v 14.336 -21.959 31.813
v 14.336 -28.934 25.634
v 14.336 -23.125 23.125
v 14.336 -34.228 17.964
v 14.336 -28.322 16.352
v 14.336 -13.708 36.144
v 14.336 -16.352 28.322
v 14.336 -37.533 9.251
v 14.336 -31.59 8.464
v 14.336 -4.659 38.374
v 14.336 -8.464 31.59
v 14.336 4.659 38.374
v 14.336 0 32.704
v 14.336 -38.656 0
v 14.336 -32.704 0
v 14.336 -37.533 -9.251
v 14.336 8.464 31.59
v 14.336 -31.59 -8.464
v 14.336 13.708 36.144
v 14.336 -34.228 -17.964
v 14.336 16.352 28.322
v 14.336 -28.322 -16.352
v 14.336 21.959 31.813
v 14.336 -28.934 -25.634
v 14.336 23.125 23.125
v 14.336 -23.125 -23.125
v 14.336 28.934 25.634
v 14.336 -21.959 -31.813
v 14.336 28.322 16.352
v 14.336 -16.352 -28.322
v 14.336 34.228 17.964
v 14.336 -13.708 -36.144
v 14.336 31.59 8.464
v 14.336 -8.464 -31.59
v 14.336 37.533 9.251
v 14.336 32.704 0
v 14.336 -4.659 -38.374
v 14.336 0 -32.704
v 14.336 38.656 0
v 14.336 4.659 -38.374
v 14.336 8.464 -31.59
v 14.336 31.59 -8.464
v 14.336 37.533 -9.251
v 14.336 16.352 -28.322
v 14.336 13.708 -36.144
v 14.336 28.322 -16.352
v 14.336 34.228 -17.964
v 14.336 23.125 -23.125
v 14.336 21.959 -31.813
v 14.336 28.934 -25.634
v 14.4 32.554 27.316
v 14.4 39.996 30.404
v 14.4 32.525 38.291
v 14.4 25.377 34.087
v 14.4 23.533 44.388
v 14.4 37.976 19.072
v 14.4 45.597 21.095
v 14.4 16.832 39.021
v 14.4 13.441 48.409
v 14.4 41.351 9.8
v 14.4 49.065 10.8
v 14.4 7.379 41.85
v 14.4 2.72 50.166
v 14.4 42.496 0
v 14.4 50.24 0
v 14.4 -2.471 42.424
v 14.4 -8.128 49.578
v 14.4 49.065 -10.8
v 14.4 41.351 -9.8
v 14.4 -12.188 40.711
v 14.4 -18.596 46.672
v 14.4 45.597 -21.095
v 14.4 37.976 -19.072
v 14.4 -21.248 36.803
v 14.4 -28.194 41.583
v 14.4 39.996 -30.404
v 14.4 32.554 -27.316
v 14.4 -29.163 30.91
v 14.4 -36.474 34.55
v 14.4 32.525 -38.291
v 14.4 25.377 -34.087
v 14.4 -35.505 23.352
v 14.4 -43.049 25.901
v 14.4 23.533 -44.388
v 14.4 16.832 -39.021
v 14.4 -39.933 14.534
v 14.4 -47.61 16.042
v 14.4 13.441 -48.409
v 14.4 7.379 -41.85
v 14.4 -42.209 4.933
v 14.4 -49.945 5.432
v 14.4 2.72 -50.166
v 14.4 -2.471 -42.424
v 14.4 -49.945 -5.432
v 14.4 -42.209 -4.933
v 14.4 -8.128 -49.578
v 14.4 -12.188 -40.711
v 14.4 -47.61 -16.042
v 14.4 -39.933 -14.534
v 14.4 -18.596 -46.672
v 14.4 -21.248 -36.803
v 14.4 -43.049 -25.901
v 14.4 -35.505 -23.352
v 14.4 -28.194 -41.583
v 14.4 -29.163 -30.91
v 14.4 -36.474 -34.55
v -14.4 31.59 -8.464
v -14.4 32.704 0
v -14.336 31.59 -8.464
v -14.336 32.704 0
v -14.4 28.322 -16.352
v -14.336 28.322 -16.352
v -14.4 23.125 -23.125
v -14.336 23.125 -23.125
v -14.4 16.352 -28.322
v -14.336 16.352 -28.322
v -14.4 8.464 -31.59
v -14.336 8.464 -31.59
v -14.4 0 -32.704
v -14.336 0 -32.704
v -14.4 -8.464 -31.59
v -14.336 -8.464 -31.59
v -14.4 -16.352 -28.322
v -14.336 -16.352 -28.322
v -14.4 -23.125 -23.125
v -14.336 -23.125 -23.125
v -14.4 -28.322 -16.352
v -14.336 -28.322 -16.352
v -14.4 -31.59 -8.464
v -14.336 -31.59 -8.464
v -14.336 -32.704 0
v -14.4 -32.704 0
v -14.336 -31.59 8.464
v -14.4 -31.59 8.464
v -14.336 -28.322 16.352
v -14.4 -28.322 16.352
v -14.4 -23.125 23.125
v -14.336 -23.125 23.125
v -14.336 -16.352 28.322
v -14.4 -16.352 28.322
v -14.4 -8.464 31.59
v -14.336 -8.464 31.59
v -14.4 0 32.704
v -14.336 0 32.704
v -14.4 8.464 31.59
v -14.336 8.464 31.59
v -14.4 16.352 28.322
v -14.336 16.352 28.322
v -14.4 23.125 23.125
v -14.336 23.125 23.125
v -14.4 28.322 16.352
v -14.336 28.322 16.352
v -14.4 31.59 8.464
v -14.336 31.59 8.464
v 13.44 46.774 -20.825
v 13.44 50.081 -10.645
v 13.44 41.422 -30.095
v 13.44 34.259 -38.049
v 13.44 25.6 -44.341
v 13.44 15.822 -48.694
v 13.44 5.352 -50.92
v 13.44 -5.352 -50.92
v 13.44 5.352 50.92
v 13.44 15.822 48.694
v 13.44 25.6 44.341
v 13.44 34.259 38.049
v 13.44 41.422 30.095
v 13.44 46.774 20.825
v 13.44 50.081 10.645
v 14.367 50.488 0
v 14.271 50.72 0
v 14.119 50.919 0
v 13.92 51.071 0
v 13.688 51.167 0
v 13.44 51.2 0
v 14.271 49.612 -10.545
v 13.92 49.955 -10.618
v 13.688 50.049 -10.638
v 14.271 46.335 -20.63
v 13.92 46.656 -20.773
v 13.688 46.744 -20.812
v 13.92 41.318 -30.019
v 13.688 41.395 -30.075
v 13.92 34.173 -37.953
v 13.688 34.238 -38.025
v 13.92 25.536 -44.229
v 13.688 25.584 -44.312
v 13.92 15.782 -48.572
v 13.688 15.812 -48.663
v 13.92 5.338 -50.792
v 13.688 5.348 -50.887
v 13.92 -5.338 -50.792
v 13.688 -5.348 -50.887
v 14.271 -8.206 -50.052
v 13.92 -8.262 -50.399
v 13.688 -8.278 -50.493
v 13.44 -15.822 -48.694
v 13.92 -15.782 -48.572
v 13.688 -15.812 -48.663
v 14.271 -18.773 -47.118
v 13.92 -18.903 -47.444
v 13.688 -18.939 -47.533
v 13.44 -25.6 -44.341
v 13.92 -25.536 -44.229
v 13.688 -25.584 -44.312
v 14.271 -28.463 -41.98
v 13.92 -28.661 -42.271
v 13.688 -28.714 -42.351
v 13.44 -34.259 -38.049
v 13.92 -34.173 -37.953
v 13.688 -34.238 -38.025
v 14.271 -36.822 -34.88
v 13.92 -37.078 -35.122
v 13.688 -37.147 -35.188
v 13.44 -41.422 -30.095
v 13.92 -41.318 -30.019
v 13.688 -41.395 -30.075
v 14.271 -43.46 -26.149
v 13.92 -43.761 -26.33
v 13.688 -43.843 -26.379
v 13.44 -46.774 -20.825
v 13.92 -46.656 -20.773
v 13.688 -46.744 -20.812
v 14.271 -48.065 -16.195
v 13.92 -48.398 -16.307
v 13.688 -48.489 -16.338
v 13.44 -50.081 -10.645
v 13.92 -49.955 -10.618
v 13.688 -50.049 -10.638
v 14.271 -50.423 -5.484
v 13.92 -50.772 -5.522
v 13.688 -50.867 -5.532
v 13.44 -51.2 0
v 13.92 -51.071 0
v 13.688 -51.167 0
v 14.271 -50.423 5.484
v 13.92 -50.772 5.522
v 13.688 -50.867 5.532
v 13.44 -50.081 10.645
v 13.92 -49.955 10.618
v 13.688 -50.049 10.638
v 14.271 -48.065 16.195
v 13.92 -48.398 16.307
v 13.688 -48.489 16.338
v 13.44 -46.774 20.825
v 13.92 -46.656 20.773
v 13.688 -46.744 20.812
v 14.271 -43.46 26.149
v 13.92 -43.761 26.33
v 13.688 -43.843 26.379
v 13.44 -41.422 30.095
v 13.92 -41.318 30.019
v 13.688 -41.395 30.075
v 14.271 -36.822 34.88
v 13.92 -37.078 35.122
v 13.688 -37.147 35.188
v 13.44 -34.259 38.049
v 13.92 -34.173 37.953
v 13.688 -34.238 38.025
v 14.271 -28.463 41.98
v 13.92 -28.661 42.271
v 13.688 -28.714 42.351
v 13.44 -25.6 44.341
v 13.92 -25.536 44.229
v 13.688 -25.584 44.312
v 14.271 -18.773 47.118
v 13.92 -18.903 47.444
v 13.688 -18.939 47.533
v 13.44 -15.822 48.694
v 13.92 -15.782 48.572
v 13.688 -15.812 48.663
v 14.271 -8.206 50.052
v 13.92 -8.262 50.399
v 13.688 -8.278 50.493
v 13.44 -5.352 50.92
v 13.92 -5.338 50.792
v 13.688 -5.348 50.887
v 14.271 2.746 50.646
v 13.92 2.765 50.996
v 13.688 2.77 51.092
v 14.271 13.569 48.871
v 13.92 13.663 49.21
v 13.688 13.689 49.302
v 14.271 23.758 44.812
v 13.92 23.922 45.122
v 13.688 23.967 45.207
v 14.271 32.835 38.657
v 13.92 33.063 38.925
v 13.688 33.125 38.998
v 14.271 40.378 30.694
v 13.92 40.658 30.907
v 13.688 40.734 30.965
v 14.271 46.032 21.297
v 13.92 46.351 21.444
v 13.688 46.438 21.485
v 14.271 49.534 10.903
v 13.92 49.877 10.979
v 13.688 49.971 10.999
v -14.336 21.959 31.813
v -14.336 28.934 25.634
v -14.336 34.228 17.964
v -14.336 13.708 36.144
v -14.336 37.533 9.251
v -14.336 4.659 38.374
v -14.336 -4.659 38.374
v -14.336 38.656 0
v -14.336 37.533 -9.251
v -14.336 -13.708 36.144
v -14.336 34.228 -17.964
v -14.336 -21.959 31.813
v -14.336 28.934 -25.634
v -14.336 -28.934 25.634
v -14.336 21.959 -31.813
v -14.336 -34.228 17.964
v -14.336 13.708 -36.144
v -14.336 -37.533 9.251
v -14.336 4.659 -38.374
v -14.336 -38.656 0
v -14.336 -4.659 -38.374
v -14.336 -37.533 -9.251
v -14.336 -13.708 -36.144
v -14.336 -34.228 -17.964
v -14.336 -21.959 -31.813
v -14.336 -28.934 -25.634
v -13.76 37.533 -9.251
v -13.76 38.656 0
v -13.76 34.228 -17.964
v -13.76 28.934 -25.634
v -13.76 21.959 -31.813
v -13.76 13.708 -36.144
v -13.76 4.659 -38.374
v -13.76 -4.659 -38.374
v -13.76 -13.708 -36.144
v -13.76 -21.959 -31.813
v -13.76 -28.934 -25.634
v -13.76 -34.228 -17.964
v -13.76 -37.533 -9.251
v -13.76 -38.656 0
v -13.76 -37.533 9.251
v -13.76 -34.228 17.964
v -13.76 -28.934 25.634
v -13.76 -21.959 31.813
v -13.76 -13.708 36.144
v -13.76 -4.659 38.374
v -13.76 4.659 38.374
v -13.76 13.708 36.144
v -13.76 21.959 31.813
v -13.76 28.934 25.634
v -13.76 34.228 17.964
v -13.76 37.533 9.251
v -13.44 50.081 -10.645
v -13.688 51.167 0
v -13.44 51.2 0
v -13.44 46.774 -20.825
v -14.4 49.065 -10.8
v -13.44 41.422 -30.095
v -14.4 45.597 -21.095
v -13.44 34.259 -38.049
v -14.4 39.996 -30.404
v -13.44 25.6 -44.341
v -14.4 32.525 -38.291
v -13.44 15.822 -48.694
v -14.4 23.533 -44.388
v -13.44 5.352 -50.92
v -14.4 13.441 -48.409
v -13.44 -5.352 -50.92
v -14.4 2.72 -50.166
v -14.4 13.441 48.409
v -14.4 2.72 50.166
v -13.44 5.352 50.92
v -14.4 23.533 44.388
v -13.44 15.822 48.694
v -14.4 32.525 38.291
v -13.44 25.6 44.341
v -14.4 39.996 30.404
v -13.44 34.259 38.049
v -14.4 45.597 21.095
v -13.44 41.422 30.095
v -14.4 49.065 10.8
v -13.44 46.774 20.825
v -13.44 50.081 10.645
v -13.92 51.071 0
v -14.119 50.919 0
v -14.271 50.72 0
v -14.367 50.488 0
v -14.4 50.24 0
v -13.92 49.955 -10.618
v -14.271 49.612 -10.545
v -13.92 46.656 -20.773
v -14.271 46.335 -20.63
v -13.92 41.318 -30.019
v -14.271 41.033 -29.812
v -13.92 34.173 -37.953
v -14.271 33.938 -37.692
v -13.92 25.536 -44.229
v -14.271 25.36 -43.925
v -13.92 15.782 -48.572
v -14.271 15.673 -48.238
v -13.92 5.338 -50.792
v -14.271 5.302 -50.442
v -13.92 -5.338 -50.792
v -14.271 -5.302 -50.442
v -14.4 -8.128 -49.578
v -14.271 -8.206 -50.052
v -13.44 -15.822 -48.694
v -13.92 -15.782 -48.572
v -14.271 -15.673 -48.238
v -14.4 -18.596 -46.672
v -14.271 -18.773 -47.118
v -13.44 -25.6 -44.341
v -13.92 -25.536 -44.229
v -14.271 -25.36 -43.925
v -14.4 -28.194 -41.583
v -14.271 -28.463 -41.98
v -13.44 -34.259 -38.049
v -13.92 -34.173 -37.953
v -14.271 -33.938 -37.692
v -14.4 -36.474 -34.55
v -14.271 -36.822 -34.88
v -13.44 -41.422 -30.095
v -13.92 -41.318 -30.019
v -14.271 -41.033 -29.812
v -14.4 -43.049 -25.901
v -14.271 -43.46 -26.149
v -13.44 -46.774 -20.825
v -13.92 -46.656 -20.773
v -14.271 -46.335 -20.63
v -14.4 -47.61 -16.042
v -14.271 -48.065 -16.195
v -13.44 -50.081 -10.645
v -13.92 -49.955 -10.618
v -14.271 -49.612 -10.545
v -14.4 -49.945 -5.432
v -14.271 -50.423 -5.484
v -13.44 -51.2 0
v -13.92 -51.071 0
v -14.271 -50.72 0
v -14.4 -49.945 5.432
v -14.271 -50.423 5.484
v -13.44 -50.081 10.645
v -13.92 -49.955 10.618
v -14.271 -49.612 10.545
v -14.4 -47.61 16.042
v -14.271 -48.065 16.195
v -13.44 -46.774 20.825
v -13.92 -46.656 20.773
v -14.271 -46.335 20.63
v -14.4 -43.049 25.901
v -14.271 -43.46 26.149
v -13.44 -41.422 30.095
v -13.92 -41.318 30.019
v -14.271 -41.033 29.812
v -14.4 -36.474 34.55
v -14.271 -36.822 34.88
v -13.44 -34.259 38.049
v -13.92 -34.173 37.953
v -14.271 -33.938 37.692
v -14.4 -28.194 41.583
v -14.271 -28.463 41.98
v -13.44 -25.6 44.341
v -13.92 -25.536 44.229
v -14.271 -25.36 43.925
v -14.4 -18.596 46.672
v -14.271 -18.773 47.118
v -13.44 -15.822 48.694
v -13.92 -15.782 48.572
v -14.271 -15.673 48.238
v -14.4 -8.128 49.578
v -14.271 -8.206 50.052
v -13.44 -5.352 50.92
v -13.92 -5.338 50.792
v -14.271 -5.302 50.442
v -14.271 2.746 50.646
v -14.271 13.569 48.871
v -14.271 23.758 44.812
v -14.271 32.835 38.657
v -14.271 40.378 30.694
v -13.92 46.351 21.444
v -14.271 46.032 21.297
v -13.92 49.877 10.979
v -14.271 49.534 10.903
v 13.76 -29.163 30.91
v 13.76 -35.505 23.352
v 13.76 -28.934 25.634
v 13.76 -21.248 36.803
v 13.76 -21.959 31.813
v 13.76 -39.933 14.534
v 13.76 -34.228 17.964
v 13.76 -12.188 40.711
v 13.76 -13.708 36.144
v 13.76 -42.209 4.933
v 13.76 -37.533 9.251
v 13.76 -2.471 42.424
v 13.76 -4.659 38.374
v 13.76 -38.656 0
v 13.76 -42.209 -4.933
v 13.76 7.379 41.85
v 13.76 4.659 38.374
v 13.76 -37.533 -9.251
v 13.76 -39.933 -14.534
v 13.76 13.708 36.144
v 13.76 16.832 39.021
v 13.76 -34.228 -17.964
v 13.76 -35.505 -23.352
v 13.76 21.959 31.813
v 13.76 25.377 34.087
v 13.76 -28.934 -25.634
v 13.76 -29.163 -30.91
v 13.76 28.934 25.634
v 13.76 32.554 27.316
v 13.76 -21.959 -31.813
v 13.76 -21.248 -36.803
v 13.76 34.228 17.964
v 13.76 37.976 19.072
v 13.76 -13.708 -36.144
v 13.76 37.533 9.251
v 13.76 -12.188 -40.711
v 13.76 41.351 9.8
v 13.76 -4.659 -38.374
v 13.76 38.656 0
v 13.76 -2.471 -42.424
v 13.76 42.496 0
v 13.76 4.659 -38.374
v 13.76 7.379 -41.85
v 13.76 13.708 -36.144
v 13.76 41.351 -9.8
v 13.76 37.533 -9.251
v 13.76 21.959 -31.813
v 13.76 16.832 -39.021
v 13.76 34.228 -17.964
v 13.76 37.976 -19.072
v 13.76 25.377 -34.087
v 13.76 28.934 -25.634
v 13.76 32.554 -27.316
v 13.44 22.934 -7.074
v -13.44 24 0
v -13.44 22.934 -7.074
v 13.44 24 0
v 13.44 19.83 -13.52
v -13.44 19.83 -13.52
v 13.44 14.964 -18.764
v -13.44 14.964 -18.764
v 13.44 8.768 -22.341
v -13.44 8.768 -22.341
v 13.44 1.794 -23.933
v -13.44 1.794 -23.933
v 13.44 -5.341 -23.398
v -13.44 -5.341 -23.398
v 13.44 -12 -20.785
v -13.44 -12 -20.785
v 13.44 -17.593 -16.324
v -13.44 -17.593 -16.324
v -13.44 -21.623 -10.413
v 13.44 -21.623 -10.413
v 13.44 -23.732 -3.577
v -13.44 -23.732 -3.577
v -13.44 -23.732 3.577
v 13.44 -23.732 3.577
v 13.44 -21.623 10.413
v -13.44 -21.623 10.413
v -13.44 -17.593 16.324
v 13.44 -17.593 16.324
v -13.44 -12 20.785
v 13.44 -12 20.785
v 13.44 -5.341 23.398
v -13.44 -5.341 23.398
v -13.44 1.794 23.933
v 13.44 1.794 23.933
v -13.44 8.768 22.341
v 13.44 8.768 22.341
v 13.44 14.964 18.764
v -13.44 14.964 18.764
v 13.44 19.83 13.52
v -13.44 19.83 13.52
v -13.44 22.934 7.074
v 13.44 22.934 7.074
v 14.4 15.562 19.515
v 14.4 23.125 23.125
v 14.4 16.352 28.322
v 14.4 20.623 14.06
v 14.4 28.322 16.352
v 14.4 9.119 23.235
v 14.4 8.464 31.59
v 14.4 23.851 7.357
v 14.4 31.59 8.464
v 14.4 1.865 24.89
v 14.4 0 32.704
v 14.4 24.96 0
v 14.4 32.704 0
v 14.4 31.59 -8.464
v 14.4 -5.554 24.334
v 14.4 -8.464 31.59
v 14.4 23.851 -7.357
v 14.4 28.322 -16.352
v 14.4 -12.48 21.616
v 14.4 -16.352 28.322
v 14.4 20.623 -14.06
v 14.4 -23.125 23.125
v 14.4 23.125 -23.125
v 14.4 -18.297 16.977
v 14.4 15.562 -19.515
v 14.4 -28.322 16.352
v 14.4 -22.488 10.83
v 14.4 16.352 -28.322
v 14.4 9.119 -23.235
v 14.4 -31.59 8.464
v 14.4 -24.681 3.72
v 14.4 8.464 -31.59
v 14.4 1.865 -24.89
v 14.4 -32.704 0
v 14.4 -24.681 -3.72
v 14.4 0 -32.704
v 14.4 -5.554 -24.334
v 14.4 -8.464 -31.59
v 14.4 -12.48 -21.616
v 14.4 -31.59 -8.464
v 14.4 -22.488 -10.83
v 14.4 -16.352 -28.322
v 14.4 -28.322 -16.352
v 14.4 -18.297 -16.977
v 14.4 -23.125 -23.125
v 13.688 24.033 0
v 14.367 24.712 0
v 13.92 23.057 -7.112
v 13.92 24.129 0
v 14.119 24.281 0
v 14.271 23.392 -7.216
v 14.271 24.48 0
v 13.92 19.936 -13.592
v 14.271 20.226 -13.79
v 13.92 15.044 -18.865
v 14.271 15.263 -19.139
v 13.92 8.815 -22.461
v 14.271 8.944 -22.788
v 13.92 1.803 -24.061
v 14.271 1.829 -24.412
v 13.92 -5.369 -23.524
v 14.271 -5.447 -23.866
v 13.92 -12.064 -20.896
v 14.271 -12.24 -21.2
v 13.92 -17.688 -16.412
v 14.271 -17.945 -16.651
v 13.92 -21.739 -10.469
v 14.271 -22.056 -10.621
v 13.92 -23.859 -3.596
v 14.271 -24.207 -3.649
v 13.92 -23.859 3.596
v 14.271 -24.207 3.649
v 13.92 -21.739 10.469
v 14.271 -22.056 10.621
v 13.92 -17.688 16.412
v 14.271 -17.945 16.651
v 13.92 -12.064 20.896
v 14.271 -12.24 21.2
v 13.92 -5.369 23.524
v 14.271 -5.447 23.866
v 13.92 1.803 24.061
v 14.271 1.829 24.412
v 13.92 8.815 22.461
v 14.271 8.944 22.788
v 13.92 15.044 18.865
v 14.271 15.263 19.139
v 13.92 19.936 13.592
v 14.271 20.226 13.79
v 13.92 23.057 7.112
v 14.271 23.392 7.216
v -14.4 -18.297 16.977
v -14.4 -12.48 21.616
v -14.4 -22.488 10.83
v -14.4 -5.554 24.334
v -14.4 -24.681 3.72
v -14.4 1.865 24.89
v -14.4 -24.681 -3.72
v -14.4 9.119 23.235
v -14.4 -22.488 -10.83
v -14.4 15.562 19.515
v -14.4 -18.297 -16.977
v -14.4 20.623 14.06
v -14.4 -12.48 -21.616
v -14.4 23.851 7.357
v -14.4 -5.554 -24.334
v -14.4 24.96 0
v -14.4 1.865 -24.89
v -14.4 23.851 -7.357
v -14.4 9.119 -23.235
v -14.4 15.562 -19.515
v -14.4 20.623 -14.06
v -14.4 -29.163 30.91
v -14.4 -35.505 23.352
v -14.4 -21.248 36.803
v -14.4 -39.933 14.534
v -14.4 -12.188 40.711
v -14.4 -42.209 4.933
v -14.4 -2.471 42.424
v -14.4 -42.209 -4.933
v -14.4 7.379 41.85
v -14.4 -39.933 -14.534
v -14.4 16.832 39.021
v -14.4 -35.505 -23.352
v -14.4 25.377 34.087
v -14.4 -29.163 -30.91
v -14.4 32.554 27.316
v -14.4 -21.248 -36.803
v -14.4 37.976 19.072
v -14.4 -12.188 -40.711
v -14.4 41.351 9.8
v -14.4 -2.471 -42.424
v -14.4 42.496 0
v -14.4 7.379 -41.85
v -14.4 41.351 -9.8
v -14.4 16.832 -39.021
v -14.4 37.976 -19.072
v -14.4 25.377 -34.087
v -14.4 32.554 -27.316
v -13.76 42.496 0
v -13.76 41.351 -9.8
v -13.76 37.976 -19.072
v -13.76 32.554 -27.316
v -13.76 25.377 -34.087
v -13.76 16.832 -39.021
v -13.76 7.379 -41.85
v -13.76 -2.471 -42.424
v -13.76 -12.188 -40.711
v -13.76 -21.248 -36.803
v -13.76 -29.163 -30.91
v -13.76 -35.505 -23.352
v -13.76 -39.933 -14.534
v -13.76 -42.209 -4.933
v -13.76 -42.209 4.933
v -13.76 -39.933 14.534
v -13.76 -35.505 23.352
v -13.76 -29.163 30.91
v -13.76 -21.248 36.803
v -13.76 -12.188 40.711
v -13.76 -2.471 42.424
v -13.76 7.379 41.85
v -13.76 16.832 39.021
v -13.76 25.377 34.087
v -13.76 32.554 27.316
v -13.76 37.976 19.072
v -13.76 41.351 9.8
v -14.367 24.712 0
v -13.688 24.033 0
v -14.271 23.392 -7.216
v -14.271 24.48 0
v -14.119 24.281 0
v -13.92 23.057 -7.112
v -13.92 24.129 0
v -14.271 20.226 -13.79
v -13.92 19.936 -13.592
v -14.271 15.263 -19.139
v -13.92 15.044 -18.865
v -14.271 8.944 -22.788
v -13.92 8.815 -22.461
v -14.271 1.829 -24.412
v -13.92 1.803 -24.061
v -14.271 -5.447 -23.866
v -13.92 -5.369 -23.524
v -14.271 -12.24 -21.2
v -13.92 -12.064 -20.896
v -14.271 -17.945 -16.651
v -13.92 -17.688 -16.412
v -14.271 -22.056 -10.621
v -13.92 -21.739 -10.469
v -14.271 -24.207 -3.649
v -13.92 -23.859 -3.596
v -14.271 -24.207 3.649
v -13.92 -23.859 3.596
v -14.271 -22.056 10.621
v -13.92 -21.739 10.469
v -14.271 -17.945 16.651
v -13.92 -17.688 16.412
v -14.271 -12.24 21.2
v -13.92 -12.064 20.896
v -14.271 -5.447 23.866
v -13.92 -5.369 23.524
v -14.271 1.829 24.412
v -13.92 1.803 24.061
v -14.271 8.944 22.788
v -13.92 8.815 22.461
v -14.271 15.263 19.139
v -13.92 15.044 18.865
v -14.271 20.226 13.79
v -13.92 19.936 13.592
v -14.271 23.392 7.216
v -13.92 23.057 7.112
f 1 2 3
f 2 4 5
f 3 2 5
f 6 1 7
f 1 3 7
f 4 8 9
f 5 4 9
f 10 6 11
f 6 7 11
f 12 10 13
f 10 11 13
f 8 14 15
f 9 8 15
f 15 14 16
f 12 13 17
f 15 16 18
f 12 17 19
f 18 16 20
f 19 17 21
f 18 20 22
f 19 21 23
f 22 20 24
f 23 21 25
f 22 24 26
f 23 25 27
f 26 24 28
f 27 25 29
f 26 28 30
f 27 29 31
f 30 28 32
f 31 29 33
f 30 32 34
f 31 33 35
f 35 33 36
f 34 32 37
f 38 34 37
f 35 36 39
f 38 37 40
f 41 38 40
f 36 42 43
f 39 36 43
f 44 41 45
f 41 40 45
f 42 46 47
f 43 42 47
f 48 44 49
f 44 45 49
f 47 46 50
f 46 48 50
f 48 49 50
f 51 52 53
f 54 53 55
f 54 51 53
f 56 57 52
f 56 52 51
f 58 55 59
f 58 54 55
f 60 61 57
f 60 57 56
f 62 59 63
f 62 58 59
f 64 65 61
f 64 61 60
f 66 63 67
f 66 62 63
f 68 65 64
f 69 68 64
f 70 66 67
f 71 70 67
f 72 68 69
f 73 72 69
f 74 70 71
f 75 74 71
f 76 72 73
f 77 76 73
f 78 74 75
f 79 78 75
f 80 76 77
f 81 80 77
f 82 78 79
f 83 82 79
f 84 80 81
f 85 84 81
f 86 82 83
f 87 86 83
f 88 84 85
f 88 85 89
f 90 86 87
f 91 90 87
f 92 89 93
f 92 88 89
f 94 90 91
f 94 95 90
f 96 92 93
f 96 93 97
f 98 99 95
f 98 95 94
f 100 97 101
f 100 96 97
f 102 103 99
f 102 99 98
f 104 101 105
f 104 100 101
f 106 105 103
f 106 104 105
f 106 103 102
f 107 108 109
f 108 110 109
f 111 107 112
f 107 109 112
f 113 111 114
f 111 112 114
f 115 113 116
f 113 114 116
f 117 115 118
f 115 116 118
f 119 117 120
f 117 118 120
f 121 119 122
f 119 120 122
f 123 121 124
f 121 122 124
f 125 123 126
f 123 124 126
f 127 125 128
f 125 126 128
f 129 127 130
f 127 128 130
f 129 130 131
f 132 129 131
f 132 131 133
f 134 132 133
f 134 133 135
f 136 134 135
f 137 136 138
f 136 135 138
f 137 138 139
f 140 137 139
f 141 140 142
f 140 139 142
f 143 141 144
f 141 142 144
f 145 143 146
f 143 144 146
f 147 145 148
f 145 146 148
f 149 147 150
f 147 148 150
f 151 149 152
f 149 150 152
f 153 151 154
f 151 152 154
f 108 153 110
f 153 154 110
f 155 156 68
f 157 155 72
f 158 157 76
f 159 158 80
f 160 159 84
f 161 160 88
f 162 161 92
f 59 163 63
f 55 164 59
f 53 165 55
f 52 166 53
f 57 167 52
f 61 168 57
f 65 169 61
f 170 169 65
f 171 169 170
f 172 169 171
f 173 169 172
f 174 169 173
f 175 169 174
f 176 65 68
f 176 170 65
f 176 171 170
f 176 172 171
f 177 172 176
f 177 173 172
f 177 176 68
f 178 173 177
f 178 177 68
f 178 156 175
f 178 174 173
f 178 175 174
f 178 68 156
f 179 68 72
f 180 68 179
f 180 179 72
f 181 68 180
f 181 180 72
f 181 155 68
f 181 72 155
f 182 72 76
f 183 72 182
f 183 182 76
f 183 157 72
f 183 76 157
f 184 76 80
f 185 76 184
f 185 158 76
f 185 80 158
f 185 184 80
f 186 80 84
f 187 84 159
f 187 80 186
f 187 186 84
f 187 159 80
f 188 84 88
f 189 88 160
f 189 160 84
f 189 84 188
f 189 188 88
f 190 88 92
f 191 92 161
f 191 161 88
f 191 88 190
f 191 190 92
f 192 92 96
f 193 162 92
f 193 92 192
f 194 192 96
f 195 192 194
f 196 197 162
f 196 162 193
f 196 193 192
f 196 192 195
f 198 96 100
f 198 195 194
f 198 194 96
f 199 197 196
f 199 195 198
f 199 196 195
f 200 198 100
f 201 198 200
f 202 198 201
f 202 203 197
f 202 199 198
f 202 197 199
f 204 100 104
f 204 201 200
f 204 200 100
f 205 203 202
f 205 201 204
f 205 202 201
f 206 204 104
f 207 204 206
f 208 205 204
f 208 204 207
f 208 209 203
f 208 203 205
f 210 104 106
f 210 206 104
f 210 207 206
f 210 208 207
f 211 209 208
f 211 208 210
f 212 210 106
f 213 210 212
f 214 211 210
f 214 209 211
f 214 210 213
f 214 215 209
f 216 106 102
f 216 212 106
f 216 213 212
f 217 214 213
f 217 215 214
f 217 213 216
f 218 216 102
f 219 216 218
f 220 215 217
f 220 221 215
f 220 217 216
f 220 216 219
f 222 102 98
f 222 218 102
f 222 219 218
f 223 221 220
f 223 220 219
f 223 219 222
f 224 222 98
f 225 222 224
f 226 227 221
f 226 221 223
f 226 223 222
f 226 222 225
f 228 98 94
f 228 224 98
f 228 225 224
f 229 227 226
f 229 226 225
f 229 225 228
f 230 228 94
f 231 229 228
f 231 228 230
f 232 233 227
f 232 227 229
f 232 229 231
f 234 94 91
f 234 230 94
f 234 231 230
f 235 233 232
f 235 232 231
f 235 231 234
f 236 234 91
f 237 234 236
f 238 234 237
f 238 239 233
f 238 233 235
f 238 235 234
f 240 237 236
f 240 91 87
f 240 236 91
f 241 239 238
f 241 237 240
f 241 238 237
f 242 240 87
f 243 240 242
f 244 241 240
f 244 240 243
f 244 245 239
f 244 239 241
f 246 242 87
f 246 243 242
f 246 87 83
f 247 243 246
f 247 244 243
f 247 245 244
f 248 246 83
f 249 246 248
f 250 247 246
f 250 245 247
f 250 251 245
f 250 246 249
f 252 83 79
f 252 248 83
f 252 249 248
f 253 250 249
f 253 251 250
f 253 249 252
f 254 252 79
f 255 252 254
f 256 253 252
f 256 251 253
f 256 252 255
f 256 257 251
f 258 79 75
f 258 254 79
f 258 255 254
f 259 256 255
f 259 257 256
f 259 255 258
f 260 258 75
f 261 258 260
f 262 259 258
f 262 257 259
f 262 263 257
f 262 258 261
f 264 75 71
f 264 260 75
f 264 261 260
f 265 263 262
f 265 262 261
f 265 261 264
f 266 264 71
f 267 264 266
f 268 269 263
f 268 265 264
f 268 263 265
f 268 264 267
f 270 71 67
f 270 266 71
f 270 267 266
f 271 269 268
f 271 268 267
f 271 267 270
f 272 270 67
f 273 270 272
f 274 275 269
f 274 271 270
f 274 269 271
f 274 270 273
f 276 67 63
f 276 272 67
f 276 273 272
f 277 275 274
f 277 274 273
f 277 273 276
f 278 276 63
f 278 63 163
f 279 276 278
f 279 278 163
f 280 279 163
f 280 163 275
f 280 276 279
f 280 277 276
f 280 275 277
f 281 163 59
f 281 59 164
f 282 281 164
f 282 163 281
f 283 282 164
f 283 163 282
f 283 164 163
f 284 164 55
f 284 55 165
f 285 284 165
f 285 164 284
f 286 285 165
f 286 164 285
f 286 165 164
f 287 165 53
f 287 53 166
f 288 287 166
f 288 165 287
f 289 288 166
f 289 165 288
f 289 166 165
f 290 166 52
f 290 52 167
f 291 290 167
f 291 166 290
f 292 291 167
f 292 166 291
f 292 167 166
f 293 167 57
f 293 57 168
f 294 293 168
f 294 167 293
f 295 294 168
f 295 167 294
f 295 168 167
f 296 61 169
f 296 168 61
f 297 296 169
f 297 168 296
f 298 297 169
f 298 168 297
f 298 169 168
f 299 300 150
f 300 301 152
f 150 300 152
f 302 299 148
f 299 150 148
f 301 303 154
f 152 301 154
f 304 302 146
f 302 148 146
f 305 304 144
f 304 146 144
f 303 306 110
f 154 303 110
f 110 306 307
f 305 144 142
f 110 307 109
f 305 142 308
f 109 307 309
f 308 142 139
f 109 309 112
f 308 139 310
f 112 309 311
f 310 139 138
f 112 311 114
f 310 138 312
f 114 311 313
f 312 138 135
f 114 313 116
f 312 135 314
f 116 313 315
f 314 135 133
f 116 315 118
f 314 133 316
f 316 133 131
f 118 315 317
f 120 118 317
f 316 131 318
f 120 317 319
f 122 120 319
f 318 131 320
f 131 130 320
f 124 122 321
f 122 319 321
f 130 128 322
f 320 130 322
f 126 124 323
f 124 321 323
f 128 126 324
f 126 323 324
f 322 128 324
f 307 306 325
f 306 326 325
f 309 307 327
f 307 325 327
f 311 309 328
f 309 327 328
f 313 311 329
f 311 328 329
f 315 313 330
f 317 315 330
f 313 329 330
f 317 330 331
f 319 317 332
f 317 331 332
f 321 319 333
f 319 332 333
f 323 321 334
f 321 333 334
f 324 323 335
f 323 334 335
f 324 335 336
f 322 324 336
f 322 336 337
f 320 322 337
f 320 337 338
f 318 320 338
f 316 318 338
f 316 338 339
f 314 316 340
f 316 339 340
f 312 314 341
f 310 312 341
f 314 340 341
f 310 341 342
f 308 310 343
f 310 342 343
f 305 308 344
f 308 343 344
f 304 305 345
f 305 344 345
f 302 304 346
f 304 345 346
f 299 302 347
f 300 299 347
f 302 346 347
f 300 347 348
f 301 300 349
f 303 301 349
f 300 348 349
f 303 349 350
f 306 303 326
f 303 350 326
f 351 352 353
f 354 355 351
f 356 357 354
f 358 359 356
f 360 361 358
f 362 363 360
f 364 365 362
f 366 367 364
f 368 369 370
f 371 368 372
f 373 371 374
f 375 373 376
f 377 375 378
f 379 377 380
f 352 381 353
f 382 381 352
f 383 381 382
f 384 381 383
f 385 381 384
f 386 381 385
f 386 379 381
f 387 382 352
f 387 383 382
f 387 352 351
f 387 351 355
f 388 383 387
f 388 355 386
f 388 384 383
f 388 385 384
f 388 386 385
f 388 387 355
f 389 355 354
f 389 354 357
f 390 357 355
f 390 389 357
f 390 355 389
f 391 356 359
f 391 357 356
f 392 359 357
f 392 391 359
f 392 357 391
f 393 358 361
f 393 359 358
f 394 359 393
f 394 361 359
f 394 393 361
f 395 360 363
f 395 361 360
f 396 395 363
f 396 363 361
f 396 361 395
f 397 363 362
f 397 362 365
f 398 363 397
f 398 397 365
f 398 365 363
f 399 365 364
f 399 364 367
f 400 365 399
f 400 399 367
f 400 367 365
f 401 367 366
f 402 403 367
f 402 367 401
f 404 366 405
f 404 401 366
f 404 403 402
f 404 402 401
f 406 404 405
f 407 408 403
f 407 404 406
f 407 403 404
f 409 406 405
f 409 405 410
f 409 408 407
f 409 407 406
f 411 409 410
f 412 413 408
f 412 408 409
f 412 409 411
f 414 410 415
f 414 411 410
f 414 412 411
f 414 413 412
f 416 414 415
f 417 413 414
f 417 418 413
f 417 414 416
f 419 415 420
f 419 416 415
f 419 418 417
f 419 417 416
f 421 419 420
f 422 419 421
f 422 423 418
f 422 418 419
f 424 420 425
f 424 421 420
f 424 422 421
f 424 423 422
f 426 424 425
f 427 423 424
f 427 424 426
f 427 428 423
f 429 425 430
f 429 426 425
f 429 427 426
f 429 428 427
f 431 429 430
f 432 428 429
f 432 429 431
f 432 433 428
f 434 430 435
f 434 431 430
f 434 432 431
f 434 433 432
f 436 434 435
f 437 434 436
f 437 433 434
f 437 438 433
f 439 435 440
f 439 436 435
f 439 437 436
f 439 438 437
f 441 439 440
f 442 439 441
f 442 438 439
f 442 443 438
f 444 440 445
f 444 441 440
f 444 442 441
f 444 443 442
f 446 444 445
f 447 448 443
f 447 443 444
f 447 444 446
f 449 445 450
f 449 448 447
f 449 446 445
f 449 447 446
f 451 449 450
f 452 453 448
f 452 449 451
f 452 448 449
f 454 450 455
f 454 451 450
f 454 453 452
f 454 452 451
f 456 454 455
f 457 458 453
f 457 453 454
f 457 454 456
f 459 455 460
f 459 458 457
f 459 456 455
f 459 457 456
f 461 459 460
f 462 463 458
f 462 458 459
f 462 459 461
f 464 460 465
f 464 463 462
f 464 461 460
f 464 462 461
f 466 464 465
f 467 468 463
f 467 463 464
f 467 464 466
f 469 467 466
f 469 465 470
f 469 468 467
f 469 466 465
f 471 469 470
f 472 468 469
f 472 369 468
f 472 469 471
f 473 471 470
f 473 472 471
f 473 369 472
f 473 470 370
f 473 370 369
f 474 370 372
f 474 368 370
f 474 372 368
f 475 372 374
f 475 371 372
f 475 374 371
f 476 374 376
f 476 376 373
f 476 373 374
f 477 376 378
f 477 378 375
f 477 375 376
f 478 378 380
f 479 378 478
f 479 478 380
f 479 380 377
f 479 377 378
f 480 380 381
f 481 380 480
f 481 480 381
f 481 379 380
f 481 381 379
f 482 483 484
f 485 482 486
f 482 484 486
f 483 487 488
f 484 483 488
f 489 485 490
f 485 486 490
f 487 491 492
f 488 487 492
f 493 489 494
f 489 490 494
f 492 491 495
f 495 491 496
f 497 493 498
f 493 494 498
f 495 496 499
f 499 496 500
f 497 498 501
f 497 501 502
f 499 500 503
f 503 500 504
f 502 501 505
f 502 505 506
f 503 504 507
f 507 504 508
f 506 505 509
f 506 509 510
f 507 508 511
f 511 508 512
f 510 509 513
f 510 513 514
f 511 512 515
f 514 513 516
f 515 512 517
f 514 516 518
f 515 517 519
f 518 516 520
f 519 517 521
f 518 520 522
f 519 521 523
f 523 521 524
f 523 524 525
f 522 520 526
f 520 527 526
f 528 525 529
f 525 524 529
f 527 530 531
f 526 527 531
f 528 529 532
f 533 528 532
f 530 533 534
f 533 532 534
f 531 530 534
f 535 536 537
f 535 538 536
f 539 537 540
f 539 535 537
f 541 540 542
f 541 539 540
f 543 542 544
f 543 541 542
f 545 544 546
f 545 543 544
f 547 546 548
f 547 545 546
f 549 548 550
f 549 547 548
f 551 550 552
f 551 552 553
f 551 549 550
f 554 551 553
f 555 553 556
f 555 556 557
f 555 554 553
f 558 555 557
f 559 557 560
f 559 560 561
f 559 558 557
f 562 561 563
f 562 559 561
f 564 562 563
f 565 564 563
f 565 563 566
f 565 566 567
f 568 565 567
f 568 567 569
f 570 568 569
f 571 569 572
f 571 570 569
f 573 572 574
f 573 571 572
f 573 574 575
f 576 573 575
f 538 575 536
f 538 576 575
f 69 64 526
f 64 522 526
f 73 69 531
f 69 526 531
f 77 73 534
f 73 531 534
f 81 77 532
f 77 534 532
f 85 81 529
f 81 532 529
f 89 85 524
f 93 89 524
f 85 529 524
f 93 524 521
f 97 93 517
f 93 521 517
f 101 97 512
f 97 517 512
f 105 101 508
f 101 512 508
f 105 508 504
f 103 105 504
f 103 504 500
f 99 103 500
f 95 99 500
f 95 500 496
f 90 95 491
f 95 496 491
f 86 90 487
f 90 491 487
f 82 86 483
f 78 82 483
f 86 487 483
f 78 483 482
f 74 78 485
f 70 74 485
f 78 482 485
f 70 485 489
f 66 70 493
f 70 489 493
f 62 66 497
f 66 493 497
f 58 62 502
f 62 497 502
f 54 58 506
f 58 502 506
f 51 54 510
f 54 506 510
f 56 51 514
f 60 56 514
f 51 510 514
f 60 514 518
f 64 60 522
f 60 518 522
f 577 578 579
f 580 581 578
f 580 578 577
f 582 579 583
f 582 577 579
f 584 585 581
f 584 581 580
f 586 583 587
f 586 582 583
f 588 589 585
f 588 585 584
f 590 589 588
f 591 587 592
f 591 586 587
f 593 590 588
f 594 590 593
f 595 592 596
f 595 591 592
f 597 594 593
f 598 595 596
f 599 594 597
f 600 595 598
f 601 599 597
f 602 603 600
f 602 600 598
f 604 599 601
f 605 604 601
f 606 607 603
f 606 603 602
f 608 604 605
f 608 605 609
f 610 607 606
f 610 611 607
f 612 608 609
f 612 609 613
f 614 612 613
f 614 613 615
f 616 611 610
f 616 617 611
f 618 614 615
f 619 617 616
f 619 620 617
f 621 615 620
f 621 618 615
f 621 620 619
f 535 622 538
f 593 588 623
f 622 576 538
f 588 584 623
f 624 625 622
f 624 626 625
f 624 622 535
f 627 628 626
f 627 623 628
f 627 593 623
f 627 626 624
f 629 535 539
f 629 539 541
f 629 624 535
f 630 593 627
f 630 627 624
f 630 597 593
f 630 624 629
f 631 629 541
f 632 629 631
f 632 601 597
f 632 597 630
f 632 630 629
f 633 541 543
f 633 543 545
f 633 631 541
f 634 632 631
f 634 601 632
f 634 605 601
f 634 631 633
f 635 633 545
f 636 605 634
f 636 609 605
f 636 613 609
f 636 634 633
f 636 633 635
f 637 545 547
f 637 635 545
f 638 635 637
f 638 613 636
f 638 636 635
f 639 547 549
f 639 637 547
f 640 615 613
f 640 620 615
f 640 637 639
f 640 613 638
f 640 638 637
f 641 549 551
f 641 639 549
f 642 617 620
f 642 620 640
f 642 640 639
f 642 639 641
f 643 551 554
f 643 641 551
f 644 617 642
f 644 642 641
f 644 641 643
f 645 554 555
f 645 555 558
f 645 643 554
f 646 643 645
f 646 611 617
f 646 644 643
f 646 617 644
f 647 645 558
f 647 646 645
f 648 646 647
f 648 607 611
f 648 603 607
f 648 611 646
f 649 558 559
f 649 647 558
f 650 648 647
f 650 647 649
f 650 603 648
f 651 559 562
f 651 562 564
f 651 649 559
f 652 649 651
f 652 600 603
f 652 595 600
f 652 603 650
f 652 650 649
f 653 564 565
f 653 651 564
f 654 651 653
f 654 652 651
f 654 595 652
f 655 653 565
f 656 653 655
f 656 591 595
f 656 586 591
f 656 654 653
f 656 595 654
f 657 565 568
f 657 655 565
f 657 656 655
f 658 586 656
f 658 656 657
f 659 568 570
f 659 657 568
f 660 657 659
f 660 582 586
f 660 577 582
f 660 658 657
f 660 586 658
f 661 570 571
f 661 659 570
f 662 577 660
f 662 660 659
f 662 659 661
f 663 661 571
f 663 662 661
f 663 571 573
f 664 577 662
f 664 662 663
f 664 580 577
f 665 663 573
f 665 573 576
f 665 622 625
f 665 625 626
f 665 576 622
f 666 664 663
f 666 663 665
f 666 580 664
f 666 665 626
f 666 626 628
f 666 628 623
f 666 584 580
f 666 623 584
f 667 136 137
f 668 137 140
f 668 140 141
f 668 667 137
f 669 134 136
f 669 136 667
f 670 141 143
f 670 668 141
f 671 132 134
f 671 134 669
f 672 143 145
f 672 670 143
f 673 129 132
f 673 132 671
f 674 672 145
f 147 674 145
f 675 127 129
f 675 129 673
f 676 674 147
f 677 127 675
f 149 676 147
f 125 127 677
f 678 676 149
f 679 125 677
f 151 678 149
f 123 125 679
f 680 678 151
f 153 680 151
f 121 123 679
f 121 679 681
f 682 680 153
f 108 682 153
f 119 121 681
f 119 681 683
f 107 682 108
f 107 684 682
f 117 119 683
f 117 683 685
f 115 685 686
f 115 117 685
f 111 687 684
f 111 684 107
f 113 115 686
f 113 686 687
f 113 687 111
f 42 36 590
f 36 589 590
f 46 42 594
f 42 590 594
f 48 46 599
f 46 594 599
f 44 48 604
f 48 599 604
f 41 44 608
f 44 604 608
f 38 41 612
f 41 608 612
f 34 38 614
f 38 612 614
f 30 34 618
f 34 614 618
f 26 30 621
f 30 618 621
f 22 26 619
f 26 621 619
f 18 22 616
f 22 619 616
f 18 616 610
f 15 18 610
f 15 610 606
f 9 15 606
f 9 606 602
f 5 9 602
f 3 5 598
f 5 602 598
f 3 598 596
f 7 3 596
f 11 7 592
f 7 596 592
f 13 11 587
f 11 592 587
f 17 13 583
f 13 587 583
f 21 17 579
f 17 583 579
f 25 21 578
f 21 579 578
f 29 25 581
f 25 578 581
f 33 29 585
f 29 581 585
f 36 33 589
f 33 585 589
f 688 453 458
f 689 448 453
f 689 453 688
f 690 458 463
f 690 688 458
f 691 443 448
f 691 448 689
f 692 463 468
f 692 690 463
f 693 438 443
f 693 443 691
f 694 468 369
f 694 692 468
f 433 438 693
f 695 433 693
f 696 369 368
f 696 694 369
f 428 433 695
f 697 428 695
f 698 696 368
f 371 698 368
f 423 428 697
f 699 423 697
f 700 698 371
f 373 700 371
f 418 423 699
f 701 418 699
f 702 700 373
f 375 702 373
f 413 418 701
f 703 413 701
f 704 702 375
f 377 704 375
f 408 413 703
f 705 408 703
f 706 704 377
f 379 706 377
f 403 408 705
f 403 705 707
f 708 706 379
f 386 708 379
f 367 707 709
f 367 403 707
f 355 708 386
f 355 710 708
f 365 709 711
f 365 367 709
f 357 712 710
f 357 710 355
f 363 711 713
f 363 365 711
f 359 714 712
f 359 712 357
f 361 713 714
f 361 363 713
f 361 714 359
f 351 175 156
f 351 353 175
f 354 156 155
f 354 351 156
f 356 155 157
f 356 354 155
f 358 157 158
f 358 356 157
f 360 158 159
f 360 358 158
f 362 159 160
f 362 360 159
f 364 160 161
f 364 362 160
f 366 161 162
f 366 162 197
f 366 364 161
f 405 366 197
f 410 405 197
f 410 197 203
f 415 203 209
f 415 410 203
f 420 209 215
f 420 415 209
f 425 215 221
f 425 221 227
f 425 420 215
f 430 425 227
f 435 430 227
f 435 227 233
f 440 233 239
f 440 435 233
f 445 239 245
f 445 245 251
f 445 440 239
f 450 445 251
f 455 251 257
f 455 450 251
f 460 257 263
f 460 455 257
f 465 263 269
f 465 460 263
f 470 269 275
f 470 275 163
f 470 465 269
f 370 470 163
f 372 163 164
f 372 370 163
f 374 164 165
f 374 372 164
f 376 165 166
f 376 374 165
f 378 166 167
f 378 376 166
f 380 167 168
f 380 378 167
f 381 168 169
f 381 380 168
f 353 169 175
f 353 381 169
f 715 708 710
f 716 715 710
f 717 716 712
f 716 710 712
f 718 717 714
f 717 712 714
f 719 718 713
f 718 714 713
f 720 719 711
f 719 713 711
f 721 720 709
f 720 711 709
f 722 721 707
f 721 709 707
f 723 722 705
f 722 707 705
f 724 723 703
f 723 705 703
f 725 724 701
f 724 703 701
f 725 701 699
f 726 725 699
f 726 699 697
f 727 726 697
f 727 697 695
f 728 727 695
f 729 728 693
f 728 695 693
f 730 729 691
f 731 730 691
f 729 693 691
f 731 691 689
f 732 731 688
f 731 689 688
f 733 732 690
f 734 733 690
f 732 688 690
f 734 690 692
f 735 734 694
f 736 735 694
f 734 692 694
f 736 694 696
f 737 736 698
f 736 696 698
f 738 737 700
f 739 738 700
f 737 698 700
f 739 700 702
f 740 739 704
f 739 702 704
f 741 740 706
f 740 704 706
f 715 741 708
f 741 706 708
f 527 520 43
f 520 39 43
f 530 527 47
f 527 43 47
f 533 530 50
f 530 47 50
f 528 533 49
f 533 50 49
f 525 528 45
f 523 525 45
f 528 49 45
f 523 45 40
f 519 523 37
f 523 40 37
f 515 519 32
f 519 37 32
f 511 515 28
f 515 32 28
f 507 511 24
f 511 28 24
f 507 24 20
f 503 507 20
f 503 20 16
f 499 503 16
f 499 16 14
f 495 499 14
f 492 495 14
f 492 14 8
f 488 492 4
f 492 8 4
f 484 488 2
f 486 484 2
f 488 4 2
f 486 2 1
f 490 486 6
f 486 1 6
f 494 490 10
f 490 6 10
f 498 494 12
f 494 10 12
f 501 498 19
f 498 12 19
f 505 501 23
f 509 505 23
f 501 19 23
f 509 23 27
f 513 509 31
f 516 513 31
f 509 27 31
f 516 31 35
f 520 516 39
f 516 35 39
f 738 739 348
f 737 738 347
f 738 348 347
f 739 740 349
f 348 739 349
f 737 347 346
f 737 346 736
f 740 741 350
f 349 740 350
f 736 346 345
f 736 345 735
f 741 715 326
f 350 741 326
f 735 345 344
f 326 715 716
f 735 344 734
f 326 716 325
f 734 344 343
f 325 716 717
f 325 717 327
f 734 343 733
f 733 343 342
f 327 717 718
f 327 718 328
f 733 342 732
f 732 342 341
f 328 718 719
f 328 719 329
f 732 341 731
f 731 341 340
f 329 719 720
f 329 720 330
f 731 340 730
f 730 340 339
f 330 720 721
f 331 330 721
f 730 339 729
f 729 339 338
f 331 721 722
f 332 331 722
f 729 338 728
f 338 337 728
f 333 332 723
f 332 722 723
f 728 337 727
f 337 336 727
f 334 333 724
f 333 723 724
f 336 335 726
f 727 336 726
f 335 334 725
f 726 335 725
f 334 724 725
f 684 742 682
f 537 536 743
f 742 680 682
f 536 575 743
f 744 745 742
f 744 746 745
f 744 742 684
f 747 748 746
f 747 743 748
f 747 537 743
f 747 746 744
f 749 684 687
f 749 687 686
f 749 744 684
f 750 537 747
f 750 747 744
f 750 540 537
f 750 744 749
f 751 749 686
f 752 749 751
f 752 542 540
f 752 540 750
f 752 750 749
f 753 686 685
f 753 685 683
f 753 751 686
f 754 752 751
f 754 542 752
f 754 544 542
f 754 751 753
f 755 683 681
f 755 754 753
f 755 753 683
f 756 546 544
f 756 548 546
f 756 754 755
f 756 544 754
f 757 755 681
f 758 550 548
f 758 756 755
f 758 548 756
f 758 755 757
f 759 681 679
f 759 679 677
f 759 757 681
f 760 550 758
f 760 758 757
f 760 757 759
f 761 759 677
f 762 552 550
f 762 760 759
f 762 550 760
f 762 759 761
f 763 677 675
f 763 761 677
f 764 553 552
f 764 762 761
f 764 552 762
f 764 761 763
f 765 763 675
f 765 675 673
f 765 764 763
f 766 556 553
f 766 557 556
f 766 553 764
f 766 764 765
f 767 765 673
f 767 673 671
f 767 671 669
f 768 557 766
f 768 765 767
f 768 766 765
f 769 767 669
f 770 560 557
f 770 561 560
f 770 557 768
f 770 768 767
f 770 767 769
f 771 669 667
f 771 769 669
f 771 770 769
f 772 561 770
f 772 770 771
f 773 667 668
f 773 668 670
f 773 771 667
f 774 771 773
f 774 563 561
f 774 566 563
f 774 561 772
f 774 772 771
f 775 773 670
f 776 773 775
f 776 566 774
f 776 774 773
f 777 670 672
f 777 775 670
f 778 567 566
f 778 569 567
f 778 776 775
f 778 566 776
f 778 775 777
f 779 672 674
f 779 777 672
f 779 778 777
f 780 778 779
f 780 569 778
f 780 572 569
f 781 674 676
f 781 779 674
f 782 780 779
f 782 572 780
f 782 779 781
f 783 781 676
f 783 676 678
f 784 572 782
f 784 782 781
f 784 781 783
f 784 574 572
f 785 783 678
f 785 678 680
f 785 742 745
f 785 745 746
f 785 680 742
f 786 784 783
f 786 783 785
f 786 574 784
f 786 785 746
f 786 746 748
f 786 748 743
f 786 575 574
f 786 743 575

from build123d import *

# Parameters (mm, degrees)
SCALE1_SCALE = 3.2


with BuildPart() as part:
    # Sketch1 → Revolve1 (revolve)
    with BuildSketch(Plane.XY):
        with BuildLine():
            Line((-4.5, 15.7), (-4.5, 7.8))
            ThreePointArc((-4.5, 7.8), (-4.412132034, 7.587867966), (-4.2, 7.5))
            Line((-4.2, 7.5), (4.2, 7.5))
            ThreePointArc((4.2, 7.5), (4.412132034, 7.587867966), (4.5, 7.8))
            Line((4.5, 7.8), (4.5, 15.7))
            ThreePointArc((4.5, 15.7), (4.412132034, 15.912132034), (4.2, 16))
            Line((4.2, 16), (-4.2, 16))
            ThreePointArc((-4.2, 16), (-4.412132034, 15.912132034), (-4.5, 15.7))
        make_face()
    revolve(axis=Axis((50, 0, 0), (-1, 0, 0)))

    # Sketch2 → Cut-Revolve1 (revolve, cut)
    with BuildSketch(Plane.XY):
        Polygon((-6.3, 7.5), (-4.5, 7.5), (-4.5, 10.22), (-4.48, 10.22), (-4.48, 12.08), (-4.3, 12.08), (-4.3, 13.28), (-6.3, 13.28), align=None)
    revolve(axis=Axis((50, 0, 0), (-1, 0, 0)), mode=Mode.SUBTRACT)

    # Sketch3 → Cut-Revolve2 (revolve, cut)
    with BuildSketch(Plane.XY):
        Polygon((4.3, 13.28), (4.3, 12.08), (4.48, 12.08), (4.48, 10.22), (4.5, 10.22), (4.5, 7.5), (6.3, 7.5), (6.3, 13.28), align=None)
    revolve(axis=Axis((50, 0, 0), (-1, 0, 0)), mode=Mode.SUBTRACT)


with BuildPart() as part_1:
    # Scale1: scaled about (0, 0, 0)
    add(part.part.scale(SCALE1_SCALE))


solid = part_1.part
